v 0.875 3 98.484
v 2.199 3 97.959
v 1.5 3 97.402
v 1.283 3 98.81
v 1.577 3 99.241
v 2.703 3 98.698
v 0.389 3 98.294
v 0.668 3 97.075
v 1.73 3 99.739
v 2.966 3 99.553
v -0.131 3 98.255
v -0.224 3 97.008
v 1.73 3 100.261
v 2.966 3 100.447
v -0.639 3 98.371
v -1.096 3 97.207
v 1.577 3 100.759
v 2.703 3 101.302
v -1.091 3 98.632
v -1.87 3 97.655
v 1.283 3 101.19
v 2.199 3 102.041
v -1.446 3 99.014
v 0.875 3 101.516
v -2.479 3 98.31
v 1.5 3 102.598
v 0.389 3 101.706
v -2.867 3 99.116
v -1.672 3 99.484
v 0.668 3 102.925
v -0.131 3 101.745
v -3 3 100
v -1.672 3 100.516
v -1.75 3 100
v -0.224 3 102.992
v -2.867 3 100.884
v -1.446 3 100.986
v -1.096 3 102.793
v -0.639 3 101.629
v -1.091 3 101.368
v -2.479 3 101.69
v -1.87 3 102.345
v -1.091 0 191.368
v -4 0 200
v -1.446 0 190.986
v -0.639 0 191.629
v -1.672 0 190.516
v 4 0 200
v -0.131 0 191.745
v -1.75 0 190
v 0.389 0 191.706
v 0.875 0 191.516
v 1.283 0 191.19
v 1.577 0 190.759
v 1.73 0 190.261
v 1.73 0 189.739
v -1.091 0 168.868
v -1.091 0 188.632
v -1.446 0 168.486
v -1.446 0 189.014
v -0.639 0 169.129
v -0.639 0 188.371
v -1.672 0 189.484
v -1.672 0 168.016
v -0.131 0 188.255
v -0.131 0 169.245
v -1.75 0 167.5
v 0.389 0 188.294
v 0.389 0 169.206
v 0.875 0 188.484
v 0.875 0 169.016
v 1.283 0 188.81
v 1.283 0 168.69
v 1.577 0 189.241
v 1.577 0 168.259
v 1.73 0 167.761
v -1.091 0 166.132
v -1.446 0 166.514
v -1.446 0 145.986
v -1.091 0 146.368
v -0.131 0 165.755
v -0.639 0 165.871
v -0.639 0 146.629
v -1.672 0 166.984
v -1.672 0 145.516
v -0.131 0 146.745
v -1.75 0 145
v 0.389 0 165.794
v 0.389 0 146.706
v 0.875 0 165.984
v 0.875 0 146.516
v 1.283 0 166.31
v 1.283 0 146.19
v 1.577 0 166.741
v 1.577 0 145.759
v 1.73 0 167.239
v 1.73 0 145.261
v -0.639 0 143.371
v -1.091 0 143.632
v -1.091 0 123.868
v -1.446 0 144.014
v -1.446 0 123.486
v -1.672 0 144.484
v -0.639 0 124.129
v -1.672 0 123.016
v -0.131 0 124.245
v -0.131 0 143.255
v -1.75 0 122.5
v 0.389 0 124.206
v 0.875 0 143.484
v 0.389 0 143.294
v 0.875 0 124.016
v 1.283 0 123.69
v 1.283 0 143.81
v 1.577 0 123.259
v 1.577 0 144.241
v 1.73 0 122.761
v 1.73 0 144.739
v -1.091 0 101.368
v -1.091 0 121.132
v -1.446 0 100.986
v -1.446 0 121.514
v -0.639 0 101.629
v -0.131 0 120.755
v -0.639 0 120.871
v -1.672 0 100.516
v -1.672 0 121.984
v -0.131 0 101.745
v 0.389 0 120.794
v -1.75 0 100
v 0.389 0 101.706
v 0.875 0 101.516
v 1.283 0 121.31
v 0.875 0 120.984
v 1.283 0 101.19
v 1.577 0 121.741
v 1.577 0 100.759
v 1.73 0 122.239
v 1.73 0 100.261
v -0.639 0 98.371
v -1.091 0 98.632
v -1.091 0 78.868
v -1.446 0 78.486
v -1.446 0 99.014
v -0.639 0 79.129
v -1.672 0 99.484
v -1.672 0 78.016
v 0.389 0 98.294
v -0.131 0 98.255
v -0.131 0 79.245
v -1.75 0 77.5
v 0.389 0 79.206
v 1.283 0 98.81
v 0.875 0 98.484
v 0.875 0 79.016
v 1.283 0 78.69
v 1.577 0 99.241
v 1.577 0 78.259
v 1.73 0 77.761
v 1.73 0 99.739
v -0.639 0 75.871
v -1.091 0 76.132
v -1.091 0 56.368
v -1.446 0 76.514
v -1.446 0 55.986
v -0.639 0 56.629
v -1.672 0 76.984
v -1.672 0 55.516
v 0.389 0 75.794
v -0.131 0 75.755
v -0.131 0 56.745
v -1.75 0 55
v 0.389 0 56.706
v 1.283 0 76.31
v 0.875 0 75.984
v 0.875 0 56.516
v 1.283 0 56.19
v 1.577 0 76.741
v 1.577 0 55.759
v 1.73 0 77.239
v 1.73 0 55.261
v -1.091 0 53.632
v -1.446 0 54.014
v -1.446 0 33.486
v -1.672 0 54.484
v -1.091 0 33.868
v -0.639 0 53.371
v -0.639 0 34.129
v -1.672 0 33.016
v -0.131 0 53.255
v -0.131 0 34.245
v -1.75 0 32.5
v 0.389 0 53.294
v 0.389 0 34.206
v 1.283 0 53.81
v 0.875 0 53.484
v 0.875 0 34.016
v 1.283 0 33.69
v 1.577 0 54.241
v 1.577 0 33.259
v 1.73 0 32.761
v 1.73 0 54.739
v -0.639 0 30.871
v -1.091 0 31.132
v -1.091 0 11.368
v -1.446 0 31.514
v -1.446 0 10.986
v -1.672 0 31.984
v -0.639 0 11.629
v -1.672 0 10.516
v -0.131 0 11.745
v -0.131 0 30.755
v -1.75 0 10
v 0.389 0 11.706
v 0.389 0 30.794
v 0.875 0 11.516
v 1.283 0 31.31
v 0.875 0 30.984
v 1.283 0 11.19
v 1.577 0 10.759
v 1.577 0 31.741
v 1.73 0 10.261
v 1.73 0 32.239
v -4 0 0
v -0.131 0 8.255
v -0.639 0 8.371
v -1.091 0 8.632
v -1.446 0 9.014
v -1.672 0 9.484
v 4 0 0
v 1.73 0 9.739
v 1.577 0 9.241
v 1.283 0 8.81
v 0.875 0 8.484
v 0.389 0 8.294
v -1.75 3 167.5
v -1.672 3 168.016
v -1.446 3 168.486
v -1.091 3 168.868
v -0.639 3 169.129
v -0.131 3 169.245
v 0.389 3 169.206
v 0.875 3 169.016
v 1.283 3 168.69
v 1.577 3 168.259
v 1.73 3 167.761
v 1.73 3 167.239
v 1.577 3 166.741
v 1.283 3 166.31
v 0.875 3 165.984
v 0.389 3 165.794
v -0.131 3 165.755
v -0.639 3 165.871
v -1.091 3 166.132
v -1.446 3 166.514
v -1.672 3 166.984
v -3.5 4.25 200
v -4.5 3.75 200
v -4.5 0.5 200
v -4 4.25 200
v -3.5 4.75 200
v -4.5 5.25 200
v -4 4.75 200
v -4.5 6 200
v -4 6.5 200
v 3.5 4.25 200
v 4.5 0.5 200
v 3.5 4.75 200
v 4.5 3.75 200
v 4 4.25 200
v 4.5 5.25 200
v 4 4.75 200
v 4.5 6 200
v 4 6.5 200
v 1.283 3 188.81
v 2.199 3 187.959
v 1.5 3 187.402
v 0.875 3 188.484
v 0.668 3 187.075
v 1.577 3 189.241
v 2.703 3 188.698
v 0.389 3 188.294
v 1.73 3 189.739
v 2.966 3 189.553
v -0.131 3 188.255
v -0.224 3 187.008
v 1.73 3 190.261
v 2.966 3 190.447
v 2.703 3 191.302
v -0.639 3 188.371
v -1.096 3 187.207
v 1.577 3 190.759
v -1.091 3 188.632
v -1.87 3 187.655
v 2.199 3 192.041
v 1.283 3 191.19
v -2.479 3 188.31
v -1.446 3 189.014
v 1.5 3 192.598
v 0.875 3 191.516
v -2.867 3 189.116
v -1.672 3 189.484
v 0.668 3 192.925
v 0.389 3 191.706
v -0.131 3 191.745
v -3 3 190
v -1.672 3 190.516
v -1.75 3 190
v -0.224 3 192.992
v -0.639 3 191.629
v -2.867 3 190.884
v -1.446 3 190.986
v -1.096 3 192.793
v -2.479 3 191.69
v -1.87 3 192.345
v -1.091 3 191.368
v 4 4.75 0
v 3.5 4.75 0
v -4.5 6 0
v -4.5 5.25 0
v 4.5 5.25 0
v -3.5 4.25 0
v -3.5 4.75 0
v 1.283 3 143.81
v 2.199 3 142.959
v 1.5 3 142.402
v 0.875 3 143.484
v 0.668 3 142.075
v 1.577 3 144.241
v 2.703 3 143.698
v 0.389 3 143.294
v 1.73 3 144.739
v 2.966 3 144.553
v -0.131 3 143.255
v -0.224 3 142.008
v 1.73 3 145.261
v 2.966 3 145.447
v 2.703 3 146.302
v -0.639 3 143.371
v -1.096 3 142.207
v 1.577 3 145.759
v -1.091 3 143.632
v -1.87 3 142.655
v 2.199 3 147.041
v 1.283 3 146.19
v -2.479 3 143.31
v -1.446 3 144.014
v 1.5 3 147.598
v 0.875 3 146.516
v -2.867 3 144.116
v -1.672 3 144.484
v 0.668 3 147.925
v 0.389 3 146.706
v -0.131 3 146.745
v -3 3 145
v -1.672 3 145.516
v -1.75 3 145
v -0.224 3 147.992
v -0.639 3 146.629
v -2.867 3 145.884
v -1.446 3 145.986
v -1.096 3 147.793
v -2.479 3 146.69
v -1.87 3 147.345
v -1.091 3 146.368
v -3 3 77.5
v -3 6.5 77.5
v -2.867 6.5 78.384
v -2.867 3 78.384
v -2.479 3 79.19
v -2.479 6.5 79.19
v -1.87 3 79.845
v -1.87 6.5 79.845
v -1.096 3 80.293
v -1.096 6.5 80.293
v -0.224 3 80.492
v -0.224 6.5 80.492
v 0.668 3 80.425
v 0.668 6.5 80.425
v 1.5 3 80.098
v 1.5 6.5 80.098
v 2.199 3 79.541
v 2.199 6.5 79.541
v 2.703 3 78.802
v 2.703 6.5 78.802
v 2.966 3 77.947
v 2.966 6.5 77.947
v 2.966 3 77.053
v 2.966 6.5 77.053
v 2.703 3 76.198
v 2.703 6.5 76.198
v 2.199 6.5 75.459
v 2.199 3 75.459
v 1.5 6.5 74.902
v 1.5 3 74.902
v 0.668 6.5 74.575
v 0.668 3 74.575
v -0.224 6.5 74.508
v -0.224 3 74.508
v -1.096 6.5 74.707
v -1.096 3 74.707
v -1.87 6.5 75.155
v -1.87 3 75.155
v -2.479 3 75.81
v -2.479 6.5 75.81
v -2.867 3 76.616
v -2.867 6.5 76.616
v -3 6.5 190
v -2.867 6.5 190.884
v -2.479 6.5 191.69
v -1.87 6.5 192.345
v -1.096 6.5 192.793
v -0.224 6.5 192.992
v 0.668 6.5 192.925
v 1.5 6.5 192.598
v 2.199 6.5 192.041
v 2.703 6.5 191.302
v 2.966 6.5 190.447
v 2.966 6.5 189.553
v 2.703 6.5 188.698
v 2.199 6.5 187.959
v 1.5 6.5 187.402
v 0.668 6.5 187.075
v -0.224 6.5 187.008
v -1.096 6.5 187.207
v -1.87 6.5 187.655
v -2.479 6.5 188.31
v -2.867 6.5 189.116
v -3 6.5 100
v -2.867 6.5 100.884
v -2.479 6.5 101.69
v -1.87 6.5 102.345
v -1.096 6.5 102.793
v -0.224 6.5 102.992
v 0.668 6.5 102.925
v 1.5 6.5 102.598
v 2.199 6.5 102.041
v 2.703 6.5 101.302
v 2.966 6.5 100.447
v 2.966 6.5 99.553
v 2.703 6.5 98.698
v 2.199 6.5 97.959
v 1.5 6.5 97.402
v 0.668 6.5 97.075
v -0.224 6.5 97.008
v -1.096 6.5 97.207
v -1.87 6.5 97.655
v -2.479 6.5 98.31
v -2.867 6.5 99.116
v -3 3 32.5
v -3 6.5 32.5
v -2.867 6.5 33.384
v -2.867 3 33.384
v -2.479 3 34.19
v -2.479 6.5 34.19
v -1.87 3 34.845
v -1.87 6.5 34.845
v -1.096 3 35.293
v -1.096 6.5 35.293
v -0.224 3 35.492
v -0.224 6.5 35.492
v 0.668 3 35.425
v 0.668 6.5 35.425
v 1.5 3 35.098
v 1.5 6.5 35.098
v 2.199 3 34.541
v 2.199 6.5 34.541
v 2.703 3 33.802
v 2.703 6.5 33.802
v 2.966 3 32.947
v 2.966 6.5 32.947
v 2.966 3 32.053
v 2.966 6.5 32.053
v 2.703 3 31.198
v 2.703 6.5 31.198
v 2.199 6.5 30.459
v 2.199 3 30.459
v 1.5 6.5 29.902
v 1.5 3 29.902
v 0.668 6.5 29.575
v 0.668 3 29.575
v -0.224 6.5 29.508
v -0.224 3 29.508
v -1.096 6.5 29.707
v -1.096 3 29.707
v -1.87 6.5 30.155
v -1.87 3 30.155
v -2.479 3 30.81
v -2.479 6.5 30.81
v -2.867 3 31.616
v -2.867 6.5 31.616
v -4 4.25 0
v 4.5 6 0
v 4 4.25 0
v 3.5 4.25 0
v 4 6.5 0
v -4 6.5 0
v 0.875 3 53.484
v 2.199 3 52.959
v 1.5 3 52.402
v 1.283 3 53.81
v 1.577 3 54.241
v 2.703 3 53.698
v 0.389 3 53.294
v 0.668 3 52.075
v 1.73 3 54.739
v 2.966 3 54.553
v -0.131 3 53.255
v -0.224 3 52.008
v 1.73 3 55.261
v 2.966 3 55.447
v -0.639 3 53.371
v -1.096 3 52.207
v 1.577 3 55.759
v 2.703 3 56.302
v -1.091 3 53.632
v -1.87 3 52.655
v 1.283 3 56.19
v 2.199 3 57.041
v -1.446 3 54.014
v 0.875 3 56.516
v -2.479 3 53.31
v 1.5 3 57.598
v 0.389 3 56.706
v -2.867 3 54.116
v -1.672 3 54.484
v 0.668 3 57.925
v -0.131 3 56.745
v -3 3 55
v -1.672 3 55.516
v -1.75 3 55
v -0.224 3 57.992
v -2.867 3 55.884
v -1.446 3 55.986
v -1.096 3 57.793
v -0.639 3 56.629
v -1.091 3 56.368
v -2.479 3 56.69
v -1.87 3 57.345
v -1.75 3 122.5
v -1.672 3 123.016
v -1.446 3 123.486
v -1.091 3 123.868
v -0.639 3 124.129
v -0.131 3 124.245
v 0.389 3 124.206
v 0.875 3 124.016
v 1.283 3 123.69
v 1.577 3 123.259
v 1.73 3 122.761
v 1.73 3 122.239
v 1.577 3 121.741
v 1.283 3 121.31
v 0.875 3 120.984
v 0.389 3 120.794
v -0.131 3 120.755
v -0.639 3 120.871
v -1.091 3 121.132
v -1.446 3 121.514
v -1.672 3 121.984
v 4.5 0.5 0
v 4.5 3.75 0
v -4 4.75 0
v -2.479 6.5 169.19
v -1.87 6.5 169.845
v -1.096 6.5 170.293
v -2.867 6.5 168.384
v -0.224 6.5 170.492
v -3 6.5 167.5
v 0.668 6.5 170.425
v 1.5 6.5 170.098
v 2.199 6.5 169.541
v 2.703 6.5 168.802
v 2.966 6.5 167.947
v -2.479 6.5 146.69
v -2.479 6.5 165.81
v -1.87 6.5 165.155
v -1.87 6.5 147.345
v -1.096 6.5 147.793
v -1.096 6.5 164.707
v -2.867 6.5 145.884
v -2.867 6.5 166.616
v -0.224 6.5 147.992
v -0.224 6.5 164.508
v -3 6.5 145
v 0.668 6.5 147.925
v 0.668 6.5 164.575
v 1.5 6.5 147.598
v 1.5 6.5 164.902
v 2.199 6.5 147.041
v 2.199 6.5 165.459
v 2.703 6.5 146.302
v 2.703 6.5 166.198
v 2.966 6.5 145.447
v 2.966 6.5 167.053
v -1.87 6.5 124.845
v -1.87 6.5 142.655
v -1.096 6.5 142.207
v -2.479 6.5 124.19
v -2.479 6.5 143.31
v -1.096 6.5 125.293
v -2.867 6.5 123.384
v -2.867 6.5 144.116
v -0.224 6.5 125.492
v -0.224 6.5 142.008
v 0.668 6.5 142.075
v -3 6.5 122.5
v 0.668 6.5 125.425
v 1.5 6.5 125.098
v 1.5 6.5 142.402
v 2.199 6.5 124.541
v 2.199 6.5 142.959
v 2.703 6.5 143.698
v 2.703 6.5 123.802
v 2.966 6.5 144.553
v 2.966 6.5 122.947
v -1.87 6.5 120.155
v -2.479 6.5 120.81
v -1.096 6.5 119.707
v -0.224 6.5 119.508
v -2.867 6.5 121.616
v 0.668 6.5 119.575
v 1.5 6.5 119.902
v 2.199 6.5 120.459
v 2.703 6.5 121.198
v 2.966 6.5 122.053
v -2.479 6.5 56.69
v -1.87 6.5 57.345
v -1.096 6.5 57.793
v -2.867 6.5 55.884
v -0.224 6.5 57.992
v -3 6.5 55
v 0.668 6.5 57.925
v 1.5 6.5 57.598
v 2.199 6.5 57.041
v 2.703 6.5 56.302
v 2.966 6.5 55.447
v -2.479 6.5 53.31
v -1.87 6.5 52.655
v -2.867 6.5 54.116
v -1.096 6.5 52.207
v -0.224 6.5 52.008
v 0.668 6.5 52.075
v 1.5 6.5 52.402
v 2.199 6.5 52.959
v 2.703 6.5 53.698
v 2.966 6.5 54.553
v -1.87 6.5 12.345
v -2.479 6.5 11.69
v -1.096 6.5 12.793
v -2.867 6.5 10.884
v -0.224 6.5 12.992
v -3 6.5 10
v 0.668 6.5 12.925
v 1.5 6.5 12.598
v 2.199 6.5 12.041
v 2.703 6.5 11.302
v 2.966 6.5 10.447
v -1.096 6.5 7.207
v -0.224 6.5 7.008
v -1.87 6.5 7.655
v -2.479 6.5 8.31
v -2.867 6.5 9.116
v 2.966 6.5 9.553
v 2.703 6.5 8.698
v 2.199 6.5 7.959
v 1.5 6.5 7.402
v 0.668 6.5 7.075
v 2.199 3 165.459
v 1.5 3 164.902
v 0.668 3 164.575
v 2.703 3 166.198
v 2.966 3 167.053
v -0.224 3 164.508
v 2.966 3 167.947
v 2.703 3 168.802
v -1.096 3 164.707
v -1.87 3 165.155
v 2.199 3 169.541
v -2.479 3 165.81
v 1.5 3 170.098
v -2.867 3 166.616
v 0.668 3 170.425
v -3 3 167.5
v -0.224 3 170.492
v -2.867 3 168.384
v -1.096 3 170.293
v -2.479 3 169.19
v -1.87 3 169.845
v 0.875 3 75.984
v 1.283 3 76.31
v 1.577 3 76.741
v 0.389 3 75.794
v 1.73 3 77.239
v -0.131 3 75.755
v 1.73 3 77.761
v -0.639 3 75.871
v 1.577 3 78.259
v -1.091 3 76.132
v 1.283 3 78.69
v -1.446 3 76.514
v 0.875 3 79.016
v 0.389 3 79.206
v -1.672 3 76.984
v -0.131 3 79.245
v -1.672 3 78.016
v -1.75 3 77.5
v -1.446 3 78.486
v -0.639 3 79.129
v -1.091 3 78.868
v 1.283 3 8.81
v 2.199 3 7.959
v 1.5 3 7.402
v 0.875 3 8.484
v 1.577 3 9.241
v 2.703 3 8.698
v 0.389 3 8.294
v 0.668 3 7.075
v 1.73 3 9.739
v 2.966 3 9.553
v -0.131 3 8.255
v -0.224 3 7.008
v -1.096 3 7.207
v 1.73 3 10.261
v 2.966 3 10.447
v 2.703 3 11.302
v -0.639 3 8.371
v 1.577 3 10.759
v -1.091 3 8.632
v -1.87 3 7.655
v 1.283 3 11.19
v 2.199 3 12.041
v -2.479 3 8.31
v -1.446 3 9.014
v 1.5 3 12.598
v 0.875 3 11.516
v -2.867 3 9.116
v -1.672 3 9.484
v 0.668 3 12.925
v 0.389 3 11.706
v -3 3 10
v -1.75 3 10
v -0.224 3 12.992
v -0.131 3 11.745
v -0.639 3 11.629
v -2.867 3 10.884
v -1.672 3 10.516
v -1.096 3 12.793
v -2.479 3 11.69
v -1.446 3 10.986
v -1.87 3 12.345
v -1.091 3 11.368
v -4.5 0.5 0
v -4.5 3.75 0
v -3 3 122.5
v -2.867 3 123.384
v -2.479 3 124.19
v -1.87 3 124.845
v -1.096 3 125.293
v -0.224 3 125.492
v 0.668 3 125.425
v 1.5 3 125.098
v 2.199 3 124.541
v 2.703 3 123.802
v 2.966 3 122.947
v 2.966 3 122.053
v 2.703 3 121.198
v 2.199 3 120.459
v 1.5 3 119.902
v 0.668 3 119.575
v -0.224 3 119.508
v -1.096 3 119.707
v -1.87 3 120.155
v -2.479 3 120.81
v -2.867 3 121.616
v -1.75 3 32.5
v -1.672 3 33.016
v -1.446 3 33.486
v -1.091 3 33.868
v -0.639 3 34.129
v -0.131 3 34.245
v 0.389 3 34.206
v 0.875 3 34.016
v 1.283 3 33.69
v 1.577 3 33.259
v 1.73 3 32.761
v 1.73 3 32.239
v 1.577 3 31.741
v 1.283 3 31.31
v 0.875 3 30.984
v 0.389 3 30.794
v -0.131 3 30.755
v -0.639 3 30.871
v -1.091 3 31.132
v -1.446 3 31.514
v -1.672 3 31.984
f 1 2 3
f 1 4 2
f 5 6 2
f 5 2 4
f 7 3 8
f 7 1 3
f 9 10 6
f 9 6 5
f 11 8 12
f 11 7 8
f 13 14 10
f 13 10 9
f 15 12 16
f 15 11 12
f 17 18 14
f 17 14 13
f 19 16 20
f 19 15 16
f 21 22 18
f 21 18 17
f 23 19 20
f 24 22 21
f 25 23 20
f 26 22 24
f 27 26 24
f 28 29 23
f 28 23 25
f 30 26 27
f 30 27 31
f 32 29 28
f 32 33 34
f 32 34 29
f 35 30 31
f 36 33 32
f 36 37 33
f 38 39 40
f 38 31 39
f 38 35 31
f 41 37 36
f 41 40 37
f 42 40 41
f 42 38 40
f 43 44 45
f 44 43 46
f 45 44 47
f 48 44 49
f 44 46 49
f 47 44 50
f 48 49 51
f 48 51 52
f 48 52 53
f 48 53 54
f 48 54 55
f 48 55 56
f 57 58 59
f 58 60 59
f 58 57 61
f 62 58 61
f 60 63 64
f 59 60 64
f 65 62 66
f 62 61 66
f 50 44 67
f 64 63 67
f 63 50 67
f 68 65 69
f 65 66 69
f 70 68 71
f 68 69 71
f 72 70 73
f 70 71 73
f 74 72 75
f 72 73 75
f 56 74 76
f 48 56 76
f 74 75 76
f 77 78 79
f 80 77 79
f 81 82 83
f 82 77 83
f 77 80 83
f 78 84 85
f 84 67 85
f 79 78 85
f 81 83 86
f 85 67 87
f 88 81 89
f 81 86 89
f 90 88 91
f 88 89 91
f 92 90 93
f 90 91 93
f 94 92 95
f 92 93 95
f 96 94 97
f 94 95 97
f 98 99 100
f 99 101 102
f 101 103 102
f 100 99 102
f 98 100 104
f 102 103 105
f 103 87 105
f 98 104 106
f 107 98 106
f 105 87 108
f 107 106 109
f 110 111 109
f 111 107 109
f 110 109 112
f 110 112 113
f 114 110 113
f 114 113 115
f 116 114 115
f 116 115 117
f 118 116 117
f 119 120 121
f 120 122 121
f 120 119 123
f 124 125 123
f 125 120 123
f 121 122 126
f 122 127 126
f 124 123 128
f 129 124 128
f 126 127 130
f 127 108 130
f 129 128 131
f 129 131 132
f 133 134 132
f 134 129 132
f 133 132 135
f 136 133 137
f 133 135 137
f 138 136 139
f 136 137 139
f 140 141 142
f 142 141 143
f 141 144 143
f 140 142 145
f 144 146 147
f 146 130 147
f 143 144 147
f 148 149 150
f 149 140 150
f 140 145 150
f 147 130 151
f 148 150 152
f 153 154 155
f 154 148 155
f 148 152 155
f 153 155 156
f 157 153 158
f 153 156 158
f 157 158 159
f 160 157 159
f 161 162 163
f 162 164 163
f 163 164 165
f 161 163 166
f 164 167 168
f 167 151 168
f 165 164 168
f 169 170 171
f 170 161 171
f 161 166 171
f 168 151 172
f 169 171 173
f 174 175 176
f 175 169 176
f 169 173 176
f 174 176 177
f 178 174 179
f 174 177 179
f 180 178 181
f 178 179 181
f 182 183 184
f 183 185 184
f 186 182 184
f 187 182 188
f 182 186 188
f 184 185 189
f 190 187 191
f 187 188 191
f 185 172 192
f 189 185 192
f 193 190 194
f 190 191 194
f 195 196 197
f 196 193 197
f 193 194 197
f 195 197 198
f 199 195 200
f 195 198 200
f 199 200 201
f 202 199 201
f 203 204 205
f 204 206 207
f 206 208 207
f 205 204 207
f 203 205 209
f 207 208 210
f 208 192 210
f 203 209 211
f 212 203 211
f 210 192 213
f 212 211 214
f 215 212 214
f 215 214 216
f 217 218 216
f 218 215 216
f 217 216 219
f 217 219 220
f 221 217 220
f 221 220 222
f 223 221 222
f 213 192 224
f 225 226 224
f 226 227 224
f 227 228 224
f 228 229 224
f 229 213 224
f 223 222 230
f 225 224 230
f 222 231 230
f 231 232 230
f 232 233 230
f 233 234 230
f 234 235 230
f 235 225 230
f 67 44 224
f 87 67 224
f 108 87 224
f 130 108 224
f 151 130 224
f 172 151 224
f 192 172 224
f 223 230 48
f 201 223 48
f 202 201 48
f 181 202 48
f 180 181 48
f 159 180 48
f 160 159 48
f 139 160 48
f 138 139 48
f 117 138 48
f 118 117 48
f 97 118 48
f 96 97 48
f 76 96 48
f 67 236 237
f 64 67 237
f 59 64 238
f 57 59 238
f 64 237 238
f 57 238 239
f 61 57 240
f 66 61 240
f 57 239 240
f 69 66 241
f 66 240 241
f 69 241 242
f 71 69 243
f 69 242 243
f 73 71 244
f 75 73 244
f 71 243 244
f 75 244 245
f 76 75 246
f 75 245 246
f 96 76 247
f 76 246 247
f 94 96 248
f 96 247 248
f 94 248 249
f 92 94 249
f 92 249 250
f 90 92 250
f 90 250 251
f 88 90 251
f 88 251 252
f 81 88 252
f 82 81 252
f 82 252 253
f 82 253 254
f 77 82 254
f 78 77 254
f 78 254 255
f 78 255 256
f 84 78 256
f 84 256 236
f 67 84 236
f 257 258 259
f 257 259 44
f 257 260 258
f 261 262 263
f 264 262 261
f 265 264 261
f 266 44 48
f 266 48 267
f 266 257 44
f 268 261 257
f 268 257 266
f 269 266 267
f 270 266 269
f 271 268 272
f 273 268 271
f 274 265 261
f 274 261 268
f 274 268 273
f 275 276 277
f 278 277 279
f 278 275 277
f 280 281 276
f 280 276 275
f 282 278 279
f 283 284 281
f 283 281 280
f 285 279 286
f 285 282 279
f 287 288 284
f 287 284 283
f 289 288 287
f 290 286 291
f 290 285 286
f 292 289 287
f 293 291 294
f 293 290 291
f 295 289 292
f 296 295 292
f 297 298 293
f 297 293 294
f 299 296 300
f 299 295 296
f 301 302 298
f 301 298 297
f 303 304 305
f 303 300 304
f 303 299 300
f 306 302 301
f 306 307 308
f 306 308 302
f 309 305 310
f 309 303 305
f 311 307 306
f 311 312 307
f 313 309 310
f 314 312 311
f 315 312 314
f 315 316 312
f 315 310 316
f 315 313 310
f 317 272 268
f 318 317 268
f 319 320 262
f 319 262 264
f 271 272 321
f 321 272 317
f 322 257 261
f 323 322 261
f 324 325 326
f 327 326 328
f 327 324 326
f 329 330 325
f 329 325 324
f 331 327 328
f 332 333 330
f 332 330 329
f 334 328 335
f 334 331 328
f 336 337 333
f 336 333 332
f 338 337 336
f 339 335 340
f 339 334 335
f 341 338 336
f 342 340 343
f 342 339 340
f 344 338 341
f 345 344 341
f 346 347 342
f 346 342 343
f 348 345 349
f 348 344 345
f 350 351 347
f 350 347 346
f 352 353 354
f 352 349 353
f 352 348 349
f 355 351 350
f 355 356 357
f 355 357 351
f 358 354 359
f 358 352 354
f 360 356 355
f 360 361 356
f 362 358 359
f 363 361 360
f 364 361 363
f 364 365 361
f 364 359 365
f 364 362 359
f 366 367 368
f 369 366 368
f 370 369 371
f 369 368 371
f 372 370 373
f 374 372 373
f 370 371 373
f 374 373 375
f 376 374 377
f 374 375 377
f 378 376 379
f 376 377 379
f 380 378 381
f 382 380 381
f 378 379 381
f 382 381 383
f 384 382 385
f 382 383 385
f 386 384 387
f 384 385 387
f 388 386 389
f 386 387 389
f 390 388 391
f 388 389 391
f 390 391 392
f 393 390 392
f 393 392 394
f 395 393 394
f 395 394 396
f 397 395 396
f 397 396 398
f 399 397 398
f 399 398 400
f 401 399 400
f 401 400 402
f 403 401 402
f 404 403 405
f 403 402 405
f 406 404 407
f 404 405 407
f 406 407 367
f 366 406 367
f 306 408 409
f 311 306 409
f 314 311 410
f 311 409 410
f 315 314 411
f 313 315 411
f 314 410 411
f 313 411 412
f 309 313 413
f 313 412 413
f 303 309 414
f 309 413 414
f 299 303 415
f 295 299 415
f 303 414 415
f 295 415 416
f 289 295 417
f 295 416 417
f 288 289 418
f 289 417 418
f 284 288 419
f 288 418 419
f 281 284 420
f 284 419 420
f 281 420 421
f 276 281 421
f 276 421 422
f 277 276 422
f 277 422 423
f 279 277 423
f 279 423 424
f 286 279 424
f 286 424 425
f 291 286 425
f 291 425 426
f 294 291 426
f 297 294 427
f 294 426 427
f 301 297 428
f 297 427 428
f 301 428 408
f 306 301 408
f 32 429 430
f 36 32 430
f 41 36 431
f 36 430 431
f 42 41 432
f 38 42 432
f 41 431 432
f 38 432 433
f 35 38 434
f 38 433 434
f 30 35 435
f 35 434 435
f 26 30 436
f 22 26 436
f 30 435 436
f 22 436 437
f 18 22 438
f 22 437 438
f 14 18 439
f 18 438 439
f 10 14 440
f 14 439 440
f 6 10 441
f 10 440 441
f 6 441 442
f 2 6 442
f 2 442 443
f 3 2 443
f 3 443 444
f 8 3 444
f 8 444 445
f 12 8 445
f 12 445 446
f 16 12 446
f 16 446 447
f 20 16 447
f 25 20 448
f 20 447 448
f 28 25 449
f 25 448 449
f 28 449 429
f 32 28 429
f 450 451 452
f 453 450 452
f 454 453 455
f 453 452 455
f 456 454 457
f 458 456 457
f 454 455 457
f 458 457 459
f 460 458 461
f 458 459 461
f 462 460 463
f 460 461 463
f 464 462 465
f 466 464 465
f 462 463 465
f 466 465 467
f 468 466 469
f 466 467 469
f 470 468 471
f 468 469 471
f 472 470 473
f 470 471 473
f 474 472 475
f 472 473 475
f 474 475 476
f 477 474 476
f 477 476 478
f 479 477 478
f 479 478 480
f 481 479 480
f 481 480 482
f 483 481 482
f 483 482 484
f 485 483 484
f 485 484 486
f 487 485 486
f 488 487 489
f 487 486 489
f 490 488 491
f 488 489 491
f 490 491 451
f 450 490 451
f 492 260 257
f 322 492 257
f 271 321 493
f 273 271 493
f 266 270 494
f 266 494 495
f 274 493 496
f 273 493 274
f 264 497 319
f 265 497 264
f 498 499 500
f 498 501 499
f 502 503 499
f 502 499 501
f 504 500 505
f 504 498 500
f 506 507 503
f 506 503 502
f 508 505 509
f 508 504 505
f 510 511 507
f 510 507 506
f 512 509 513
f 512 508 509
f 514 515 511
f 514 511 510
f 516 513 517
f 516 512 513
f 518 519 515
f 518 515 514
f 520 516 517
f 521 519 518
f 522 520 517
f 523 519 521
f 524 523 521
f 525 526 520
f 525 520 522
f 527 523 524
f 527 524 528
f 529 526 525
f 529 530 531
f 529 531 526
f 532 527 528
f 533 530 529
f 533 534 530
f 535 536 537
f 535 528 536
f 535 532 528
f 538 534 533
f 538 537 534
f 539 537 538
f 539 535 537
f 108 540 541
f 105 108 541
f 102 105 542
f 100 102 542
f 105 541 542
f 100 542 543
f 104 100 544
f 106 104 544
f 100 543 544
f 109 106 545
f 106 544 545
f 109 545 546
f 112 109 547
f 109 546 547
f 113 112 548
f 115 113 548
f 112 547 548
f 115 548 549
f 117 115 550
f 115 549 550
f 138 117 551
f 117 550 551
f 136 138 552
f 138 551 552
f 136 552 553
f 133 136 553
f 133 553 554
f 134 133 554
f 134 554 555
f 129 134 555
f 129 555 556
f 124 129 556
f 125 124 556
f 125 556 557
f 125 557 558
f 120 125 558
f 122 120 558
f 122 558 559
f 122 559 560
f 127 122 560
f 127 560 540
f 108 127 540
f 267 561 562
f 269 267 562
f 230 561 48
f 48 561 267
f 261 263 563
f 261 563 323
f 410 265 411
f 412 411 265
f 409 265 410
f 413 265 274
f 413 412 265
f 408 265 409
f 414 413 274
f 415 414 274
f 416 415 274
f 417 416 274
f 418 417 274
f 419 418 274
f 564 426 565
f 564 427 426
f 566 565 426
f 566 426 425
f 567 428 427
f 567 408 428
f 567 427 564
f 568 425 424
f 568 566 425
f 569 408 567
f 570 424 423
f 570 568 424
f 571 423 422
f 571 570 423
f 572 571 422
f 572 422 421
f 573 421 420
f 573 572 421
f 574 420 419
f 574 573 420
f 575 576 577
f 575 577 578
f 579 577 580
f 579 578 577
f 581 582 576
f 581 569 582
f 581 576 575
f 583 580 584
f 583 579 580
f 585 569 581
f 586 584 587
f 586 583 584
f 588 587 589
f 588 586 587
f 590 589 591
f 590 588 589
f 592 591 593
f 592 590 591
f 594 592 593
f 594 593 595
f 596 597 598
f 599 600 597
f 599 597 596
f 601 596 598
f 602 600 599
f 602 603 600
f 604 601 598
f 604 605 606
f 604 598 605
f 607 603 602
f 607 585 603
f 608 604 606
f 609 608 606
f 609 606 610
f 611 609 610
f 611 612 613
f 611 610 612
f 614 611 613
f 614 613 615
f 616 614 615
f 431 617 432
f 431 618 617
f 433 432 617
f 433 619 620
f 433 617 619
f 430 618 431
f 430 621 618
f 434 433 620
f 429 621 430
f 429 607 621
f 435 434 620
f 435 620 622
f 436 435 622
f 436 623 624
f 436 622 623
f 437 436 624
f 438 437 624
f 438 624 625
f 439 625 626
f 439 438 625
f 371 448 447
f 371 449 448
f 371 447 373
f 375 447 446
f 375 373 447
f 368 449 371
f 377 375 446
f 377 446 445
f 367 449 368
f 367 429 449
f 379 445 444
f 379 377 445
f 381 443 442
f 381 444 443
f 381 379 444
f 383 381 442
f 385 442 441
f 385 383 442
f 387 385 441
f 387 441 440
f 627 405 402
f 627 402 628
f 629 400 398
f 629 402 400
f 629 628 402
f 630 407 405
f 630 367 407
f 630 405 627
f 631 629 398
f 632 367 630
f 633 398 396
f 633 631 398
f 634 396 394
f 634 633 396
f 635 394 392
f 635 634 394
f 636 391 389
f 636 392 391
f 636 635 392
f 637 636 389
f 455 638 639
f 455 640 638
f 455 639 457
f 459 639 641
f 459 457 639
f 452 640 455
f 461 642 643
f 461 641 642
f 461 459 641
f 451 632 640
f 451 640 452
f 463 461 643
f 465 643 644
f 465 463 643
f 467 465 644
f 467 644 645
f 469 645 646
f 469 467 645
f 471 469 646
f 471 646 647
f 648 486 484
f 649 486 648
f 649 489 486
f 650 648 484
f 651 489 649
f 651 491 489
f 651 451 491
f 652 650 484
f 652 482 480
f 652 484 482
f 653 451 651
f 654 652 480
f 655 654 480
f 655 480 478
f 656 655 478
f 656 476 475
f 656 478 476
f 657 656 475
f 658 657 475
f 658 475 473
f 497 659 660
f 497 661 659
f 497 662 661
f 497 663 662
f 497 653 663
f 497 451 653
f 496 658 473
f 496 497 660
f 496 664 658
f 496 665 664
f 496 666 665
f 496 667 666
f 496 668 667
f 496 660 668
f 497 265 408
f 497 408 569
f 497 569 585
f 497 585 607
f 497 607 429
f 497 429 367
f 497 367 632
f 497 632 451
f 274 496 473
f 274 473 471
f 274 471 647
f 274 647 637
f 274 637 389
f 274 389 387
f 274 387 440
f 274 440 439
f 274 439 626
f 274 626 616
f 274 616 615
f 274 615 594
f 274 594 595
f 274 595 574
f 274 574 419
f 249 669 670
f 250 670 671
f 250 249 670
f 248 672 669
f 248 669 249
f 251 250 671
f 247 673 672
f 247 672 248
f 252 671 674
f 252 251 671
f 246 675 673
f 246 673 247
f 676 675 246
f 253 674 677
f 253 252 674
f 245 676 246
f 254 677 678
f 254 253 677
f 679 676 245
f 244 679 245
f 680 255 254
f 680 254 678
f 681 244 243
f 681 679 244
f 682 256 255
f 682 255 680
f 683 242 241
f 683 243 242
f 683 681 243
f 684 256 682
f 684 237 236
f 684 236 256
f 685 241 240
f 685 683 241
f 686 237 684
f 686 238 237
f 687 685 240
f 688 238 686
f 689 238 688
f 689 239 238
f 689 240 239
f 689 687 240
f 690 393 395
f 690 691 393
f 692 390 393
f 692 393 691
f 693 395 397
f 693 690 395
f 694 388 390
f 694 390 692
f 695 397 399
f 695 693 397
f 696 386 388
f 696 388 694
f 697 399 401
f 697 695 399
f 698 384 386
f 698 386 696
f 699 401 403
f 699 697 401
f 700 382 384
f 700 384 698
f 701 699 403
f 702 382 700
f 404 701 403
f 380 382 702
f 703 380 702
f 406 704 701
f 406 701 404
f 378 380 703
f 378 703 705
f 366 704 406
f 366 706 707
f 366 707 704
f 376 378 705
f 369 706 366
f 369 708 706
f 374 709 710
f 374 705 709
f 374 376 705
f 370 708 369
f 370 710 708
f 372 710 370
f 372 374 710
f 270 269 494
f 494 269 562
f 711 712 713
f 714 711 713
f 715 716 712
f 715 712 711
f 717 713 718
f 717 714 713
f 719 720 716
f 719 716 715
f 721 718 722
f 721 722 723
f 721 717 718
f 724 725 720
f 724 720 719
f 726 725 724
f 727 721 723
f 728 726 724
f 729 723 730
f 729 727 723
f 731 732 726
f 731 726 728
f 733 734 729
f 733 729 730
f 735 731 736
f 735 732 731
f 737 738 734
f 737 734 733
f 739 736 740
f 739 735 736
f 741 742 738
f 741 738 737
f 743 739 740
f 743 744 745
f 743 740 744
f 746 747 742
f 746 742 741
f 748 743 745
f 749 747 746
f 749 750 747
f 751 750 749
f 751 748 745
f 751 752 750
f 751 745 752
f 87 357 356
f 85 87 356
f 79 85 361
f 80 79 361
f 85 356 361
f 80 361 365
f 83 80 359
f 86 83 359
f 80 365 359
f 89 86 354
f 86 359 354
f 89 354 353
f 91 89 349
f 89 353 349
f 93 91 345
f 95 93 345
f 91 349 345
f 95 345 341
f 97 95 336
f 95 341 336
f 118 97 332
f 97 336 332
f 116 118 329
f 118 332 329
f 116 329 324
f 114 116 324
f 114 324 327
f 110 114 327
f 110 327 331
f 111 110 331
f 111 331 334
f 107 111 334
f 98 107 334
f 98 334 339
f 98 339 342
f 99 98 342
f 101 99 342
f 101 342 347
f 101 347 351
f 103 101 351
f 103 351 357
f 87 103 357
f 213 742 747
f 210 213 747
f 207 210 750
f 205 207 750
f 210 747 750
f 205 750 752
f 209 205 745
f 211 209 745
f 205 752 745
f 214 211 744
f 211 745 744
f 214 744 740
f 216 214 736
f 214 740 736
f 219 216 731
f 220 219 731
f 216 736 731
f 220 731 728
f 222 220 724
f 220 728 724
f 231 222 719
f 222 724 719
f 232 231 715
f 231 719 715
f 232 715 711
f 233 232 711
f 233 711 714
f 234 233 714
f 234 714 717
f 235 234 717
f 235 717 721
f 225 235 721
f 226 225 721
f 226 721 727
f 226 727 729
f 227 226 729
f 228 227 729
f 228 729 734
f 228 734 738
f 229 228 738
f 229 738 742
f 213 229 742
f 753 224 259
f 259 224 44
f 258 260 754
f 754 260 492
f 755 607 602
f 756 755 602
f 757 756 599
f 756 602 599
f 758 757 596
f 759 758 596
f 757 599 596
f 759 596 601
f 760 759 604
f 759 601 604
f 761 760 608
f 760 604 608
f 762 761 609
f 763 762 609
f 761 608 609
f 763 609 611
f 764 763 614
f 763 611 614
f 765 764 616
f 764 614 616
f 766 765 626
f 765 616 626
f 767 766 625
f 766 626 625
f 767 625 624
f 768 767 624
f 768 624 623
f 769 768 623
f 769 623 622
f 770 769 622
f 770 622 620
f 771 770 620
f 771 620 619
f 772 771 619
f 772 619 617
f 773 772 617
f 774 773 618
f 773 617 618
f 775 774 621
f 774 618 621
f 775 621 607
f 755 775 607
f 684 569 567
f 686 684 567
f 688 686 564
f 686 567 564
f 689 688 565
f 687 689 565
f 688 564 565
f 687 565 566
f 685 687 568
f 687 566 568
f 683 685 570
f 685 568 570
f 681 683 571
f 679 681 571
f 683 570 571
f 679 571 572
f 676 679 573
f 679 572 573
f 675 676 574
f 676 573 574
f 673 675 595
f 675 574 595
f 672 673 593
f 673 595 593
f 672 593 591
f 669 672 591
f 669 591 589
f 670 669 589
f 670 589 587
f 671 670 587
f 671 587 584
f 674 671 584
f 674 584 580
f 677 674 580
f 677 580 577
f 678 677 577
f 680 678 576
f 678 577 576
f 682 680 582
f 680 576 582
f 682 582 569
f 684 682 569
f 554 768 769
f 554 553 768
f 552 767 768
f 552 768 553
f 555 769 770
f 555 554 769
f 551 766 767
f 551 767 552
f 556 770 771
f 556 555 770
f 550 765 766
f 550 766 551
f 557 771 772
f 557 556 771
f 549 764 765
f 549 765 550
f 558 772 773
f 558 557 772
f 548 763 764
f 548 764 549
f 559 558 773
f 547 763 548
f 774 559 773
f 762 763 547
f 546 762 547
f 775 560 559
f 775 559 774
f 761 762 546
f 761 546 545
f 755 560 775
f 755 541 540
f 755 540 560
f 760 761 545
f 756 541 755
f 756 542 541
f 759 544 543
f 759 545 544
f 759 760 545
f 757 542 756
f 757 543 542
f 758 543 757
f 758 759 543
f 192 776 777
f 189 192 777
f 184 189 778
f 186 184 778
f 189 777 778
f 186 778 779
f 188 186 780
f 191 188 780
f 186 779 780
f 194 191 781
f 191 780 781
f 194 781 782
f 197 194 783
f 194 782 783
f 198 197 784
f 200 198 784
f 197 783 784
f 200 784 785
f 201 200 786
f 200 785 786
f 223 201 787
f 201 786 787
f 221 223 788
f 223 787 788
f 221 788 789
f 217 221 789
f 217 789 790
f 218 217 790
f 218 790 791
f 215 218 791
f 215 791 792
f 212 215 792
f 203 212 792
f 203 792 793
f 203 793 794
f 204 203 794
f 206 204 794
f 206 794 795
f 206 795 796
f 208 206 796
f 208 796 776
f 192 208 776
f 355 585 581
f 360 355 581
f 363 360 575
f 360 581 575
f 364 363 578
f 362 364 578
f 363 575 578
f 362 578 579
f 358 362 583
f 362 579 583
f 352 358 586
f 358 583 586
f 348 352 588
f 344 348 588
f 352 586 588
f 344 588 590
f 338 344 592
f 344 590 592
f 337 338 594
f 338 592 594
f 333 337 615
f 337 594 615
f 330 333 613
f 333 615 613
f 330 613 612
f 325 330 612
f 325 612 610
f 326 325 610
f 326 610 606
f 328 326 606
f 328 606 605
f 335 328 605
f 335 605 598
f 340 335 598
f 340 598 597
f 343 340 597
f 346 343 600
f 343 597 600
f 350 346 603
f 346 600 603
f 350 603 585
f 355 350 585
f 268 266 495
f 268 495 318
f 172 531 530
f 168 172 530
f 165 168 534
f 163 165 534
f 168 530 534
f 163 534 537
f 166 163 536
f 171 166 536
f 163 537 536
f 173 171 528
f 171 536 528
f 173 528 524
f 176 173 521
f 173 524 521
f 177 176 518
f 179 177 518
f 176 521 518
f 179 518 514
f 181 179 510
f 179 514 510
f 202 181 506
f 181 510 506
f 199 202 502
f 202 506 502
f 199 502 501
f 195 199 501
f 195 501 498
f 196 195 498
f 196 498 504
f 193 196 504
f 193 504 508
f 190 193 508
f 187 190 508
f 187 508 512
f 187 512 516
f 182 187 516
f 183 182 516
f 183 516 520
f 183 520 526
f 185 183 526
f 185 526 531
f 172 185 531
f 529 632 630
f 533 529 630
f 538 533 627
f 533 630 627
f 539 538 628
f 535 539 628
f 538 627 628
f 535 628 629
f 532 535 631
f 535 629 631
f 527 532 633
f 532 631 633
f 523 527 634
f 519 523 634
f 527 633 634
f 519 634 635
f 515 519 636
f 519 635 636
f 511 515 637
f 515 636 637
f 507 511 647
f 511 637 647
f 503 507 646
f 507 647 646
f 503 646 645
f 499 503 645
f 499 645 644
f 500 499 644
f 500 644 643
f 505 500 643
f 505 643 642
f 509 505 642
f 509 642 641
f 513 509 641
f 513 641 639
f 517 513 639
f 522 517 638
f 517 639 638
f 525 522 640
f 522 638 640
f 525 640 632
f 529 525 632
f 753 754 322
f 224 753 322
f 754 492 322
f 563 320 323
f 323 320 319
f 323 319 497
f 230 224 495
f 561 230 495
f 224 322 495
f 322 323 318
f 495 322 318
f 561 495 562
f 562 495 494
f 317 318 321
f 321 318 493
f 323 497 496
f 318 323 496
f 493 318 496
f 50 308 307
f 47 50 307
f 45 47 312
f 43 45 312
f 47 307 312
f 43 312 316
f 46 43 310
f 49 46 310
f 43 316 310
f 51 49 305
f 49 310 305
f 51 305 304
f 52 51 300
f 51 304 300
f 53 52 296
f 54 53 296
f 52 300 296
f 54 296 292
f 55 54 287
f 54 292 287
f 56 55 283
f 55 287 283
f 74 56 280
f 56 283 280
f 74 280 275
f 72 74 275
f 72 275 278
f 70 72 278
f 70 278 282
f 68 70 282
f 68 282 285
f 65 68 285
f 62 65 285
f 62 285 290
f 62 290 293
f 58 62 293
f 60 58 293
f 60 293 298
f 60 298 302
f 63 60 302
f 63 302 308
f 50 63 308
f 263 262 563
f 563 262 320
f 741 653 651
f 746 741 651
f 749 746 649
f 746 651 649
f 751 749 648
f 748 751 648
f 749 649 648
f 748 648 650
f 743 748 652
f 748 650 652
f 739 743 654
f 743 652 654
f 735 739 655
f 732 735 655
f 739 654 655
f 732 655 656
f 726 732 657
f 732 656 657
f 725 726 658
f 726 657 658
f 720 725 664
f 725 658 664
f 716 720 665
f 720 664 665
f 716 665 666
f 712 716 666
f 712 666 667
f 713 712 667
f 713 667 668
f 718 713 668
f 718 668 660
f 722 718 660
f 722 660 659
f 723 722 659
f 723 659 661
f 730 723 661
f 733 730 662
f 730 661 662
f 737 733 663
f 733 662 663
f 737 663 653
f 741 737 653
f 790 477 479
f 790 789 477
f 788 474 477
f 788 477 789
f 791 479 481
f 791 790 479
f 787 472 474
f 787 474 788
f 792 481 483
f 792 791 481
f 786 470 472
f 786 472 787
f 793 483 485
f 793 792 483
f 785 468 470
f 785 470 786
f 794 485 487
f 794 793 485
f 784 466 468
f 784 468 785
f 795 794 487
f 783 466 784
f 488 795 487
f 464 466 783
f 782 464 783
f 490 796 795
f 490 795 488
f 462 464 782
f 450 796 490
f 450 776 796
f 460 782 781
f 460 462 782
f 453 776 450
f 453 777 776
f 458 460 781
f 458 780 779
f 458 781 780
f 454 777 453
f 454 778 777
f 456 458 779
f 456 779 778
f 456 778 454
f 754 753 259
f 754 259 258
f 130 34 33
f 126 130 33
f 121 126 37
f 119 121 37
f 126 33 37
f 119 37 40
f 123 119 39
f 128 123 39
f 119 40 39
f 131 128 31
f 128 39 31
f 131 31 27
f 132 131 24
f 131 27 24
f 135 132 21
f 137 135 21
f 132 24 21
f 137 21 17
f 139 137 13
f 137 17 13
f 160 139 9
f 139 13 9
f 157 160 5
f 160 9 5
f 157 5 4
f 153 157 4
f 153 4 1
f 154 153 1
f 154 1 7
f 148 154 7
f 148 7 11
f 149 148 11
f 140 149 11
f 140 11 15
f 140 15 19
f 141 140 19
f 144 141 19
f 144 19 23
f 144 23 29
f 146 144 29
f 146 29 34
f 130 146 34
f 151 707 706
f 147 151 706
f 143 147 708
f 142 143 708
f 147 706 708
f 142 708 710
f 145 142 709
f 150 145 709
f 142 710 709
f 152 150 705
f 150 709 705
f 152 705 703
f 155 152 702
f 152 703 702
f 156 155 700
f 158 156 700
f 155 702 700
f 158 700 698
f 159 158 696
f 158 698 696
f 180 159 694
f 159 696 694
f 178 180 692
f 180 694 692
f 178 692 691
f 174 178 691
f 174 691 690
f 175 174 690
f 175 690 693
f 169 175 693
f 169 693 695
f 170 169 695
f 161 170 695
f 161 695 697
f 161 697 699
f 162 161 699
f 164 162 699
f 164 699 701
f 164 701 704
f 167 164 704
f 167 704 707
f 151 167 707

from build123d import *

# Parameters (mm, degrees)
SKETCH_W               = 9
SKETCH_H               = 6.5
PAD_DEPTH              = 200
SKETCH001_W            = 1
SKETCH001_H            = 0.5
POCKET_DEPTH           = 600.616776
SKETCH002_R            = 3
POCKET001_DEPTH        = 3.5
LINEARPATTERN_COUNT    = 9
LINEARPATTERN_PITCH    = 22.5
SKETCH003_R            = 1.75
POCKET002_DEPTH        = 3.001
LINEARPATTERN001_COUNT = 9
LINEARPATTERN001_PITCH = 22.5
CHAMFER_SIZE           = 0.5


with BuildPart() as part:
    # Sketch → Pad (new body)
    with BuildSketch(Plane.XY):
        with Locations((0, 3.25)):
            Rectangle(SKETCH_W, SKETCH_H)
    extrude(amount=PAD_DEPTH)

    # Sketch001 (on Face6 of Pad) → Pocket (cut, through all)
    with BuildSketch(Plane.XY.offset(200)):
        with Locations((-4, 4.5)):
            Rectangle(SKETCH001_W, SKETCH001_H)
    pocket = extrude(amount=-POCKET_DEPTH, mode=Mode.SUBTRACT)

    # Mirrored: Pocket across Sketch001 V_Axis
    add(pocket.mirror(Plane(origin=(0, 0, 200), x_dir=(0, 0, 1), z_dir=(1, 0, 0))), mode=Mode.SUBTRACT)

    # Sketch002 (on Face11 of Mirrored) → Pocket001 (cut)
    with BuildSketch(Plane(origin=(0, 6.5, 0), x_dir=(-1, 0, 0), z_dir=(0, 1, 0))):
        with Locations((0, 10)):
            Circle(SKETCH002_R)
    pocket001 = extrude(amount=-POCKET001_DEPTH, mode=Mode.SUBTRACT)

    # LinearPattern: Pocket001 ×9
    with Locations(*[(0, 0, i * LINEARPATTERN_PITCH) for i in range(1, LINEARPATTERN_COUNT)]):
        add(pocket001, mode=Mode.SUBTRACT)

    # Sketch003 (on Face31 of LinearPattern) → Pocket002 (cut, through all)
    with BuildSketch(Plane(origin=(0, 3, 0), x_dir=(-1, 0, 0), z_dir=(0, 1, 0))):
        with Locations((0, 10)):
            Circle(SKETCH003_R)
    pocket002 = extrude(amount=-POCKET002_DEPTH, mode=Mode.SUBTRACT)

    # LinearPattern001: Pocket002 ×9
    with Locations(*[(0, 0, i * LINEARPATTERN001_PITCH) for i in range(1, LINEARPATTERN001_COUNT)]):
        add(pocket002, mode=Mode.SUBTRACT)

    # Chamfer
    chamfer_edges = [part.edges().sort_by_distance(p)[0] for p in [
        (-4.5, 0, 100),
        (-4.5, 4.25, 100),
        (-4.5, 4.75, 100),
        (-4.5, 6.5, 100),
        (4.5, 0, 100),
        (4.5, 4.25, 100),
        (4.5, 4.75, 100),
        (4.5, 6.5, 100),
    ]]
    chamfer(chamfer_edges, length=CHAMFER_SIZE)


solid = part.part
